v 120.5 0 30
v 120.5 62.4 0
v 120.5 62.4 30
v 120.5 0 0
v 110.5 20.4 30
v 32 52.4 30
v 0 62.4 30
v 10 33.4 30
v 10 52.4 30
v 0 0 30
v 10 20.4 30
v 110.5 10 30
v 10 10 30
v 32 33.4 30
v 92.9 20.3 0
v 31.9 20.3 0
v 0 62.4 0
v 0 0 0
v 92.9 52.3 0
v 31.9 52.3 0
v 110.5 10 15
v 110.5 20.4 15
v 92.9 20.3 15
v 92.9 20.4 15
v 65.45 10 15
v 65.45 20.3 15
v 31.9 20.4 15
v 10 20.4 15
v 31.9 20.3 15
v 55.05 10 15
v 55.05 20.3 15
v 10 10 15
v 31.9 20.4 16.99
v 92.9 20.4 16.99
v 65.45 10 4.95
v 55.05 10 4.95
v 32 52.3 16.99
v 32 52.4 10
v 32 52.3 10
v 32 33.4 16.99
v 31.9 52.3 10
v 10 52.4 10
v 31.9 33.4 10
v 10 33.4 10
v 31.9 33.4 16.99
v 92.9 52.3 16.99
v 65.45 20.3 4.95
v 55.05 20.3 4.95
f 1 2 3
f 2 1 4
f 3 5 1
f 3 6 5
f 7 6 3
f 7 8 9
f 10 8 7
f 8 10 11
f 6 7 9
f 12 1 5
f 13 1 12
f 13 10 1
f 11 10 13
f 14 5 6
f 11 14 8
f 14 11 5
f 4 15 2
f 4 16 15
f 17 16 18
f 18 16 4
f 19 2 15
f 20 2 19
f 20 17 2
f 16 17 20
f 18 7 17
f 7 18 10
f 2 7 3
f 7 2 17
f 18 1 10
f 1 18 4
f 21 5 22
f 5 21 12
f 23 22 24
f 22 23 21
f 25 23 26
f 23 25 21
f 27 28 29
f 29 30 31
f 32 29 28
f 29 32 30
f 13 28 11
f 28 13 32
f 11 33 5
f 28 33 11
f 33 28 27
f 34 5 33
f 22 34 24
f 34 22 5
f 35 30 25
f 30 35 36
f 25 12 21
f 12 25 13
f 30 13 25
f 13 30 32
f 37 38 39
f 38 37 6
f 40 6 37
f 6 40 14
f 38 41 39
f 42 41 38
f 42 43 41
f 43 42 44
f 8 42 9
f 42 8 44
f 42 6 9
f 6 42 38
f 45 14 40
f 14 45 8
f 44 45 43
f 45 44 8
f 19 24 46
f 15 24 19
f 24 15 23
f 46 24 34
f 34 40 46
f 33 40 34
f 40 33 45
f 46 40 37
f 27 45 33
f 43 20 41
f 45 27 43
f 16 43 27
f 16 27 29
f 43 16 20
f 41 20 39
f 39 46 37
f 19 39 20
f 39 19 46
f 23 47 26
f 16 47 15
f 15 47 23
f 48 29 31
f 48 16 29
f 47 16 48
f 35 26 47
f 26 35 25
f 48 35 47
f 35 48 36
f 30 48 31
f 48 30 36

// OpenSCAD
plexiDicke=10.4;
plexiLaenge=100.5;
plexiInKonsole=15;

BattHalterDicke=32;
BattHalterLaenge=61;
BattZ=17;

SchalterBreite=19;
SchalterLaenge=22;
SchalterEindringZ=20; // Ohne Bearbeitung 20 und mit Abzwicken 15

Rand=10;

konsZ=30;
konsY=Rand+plexiDicke+BattHalterDicke+Rand;
konsX=plexiLaenge+2*Rand;

LEDTiefe=10;


module konsole() {
  difference() {
    cube(size=[konsX,konsY,konsZ]);

    // Plexi
    translate([Rand,Rand,konsZ-plexiInKonsole]) {
        cube(size=[plexiLaenge,plexiDicke,plexiInKonsole+0.2]);
    }

    // Schalter
    translate([Rand, konsY-Rand-SchalterBreite, konsZ-SchalterEindringZ]) {
        cube(size=[SchalterLaenge, SchalterBreite, SchalterEindringZ+0.1]);
    }

    // Batteriefach
    translate([Rand+SchalterLaenge-0.1, Rand+plexiDicke-0.1, -0.01]) {
        cube(size=[BattHalterLaenge, BattHalterDicke, BattZ]);
    }

    // Aussparung für LED
    translate([konsX/2, Rand+plexiDicke/2, konsZ-plexiInKonsole-LEDTiefe/2]) {
        cube(size=[plexiDicke, plexiDicke, LEDTiefe+0.1], center=true);
    }
  }
}


// 2D Oben für DXF Export
module oben2D() {
  projection(cut=true) translate([0,0,-konsZ+0.1]) konsole();
}
// 2D Unten für DXF Export
module unten2D() {
  projection(cut=true) translate([0,0,-0.1]) konsole();
}
// 2D Mitte für DXF Export
module mitte2D() {
  projection(cut=true) translate([0,0,-konsZ+plexiInKonsole+0.1]) konsole();
}

konsole();
//oben2D();
unten2D();
//mitte2D();
